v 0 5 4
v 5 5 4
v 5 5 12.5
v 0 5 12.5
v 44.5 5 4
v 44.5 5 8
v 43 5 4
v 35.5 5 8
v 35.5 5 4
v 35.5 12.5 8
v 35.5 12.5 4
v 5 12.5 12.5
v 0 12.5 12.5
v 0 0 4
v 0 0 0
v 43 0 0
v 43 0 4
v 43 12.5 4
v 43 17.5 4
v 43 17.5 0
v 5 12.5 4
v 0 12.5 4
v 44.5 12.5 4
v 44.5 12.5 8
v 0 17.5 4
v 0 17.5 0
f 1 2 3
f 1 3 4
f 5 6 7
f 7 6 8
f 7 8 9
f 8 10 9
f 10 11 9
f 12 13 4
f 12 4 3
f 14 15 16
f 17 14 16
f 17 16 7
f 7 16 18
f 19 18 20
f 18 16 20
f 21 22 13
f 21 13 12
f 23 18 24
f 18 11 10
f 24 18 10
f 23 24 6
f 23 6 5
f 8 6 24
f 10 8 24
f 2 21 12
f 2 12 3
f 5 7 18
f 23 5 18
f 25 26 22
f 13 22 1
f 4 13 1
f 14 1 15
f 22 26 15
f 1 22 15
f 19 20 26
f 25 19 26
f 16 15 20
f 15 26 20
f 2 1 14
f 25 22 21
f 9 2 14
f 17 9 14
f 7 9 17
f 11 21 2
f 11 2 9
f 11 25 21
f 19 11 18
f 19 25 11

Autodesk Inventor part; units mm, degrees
ref_plane "YZ Plane" through (0, 0, 0) normal (1, 0, 0) x (0, 1, 0)
ref_plane "XZ Plane" through (0, 0, 0) normal (0, 1, 0) x (-1, 0, 0)
ref_plane "XY Plane" through (0, 0, 0) normal (0, 0, 1) x (1, 0, 0)
sketch "Sketch1" plane through (0, 0, 0) normal (0, 0, 1) x (1, 0, 0)
  line L0 (0, 0) -> (43, 0)
  line L1 (43, 0) -> (43, 17.5)
  line L2 (43, 17.5) -> (0, 17.5)
  line L3 (0, 17.5) -> (0, 0)
  dimension "d0" = 43
  dimension "d1" = 17.5
extrude "Extrusion1" add sketch "Sketch1" along normal blind 4
sketch "Sketch2" plane through (0, 0, 4) normal (0, 0, 1) x (1, 0, 0)
  line L0 (0, 0) -> (0, 5)
  line L1 (43, 17.5) -> (0, 17.5) projected
  line L2 (0, 17.5) -> (0, 12.5)
  line L3 (0, 17.5) -> (0, 0) projected
  line L4 (0, 12.5) -> (5, 12.5)
  line L5 (5, 12.5) -> (5, 5)
  line L6 (5, 5) -> (0, 5)
  line L7 (0, 12.5) -> (0, 5)
  line L8 (0.0001, 12.5) -> (0.0007, 5)
  dimension "d4" = 5
  dimension "d5" = 5
  dimension "d6" = 5
extrude "Extrusion2" add sketch "Sketch2" along normal blind 8.5
sketch "Sketch3" plane through (0, 0, 4) normal (0, 0, 1) x (1, 0, 0)
  line L0 (43, 0) -> (43, 17.5) projected
  line L1 (43, 0) -> (43, 5)
  line L2 (43, 5) -> (35.5, 5)
  line L3 (43, 17.5) -> (0, 17.5) projected
  line L4 (43, 17.5) -> (43, 12.5)
  line L5 (43, 12.5) -> (35.5, 12.5)
  line L6 (35.5, 12.5) -> (35.5, 5)
  point P0 (0, 0)
  dimension "d9" = 5
  dimension "d10" = 7.5
  dimension "d11" = 5
extrude "Extrusion3" add sketch "Sketch3" along normal blind 4
sketch "Sketch4" plane through (43, 0, 0) normal (1, 0, 0) x (0, 0, -1)
  line L0 (-8, 5) -> (-8, 12.5) projected
  line L1 (-4, 0) -> (-4, 5) projected
  line L2 (-8, 5) -> (-4, 5)
  line L3 (-4, 5) -> (-4, 12.5)
  line L4 (-4, 12.5) -> (-8, 12.5)
  line L5 (-8, 12.5) -> (-8, 5)
  point P0 (0, 0)
extrude "Extrusion4" add sketch "Sketch4" along normal blind 1.5
properties part number "Arduino Nano"
